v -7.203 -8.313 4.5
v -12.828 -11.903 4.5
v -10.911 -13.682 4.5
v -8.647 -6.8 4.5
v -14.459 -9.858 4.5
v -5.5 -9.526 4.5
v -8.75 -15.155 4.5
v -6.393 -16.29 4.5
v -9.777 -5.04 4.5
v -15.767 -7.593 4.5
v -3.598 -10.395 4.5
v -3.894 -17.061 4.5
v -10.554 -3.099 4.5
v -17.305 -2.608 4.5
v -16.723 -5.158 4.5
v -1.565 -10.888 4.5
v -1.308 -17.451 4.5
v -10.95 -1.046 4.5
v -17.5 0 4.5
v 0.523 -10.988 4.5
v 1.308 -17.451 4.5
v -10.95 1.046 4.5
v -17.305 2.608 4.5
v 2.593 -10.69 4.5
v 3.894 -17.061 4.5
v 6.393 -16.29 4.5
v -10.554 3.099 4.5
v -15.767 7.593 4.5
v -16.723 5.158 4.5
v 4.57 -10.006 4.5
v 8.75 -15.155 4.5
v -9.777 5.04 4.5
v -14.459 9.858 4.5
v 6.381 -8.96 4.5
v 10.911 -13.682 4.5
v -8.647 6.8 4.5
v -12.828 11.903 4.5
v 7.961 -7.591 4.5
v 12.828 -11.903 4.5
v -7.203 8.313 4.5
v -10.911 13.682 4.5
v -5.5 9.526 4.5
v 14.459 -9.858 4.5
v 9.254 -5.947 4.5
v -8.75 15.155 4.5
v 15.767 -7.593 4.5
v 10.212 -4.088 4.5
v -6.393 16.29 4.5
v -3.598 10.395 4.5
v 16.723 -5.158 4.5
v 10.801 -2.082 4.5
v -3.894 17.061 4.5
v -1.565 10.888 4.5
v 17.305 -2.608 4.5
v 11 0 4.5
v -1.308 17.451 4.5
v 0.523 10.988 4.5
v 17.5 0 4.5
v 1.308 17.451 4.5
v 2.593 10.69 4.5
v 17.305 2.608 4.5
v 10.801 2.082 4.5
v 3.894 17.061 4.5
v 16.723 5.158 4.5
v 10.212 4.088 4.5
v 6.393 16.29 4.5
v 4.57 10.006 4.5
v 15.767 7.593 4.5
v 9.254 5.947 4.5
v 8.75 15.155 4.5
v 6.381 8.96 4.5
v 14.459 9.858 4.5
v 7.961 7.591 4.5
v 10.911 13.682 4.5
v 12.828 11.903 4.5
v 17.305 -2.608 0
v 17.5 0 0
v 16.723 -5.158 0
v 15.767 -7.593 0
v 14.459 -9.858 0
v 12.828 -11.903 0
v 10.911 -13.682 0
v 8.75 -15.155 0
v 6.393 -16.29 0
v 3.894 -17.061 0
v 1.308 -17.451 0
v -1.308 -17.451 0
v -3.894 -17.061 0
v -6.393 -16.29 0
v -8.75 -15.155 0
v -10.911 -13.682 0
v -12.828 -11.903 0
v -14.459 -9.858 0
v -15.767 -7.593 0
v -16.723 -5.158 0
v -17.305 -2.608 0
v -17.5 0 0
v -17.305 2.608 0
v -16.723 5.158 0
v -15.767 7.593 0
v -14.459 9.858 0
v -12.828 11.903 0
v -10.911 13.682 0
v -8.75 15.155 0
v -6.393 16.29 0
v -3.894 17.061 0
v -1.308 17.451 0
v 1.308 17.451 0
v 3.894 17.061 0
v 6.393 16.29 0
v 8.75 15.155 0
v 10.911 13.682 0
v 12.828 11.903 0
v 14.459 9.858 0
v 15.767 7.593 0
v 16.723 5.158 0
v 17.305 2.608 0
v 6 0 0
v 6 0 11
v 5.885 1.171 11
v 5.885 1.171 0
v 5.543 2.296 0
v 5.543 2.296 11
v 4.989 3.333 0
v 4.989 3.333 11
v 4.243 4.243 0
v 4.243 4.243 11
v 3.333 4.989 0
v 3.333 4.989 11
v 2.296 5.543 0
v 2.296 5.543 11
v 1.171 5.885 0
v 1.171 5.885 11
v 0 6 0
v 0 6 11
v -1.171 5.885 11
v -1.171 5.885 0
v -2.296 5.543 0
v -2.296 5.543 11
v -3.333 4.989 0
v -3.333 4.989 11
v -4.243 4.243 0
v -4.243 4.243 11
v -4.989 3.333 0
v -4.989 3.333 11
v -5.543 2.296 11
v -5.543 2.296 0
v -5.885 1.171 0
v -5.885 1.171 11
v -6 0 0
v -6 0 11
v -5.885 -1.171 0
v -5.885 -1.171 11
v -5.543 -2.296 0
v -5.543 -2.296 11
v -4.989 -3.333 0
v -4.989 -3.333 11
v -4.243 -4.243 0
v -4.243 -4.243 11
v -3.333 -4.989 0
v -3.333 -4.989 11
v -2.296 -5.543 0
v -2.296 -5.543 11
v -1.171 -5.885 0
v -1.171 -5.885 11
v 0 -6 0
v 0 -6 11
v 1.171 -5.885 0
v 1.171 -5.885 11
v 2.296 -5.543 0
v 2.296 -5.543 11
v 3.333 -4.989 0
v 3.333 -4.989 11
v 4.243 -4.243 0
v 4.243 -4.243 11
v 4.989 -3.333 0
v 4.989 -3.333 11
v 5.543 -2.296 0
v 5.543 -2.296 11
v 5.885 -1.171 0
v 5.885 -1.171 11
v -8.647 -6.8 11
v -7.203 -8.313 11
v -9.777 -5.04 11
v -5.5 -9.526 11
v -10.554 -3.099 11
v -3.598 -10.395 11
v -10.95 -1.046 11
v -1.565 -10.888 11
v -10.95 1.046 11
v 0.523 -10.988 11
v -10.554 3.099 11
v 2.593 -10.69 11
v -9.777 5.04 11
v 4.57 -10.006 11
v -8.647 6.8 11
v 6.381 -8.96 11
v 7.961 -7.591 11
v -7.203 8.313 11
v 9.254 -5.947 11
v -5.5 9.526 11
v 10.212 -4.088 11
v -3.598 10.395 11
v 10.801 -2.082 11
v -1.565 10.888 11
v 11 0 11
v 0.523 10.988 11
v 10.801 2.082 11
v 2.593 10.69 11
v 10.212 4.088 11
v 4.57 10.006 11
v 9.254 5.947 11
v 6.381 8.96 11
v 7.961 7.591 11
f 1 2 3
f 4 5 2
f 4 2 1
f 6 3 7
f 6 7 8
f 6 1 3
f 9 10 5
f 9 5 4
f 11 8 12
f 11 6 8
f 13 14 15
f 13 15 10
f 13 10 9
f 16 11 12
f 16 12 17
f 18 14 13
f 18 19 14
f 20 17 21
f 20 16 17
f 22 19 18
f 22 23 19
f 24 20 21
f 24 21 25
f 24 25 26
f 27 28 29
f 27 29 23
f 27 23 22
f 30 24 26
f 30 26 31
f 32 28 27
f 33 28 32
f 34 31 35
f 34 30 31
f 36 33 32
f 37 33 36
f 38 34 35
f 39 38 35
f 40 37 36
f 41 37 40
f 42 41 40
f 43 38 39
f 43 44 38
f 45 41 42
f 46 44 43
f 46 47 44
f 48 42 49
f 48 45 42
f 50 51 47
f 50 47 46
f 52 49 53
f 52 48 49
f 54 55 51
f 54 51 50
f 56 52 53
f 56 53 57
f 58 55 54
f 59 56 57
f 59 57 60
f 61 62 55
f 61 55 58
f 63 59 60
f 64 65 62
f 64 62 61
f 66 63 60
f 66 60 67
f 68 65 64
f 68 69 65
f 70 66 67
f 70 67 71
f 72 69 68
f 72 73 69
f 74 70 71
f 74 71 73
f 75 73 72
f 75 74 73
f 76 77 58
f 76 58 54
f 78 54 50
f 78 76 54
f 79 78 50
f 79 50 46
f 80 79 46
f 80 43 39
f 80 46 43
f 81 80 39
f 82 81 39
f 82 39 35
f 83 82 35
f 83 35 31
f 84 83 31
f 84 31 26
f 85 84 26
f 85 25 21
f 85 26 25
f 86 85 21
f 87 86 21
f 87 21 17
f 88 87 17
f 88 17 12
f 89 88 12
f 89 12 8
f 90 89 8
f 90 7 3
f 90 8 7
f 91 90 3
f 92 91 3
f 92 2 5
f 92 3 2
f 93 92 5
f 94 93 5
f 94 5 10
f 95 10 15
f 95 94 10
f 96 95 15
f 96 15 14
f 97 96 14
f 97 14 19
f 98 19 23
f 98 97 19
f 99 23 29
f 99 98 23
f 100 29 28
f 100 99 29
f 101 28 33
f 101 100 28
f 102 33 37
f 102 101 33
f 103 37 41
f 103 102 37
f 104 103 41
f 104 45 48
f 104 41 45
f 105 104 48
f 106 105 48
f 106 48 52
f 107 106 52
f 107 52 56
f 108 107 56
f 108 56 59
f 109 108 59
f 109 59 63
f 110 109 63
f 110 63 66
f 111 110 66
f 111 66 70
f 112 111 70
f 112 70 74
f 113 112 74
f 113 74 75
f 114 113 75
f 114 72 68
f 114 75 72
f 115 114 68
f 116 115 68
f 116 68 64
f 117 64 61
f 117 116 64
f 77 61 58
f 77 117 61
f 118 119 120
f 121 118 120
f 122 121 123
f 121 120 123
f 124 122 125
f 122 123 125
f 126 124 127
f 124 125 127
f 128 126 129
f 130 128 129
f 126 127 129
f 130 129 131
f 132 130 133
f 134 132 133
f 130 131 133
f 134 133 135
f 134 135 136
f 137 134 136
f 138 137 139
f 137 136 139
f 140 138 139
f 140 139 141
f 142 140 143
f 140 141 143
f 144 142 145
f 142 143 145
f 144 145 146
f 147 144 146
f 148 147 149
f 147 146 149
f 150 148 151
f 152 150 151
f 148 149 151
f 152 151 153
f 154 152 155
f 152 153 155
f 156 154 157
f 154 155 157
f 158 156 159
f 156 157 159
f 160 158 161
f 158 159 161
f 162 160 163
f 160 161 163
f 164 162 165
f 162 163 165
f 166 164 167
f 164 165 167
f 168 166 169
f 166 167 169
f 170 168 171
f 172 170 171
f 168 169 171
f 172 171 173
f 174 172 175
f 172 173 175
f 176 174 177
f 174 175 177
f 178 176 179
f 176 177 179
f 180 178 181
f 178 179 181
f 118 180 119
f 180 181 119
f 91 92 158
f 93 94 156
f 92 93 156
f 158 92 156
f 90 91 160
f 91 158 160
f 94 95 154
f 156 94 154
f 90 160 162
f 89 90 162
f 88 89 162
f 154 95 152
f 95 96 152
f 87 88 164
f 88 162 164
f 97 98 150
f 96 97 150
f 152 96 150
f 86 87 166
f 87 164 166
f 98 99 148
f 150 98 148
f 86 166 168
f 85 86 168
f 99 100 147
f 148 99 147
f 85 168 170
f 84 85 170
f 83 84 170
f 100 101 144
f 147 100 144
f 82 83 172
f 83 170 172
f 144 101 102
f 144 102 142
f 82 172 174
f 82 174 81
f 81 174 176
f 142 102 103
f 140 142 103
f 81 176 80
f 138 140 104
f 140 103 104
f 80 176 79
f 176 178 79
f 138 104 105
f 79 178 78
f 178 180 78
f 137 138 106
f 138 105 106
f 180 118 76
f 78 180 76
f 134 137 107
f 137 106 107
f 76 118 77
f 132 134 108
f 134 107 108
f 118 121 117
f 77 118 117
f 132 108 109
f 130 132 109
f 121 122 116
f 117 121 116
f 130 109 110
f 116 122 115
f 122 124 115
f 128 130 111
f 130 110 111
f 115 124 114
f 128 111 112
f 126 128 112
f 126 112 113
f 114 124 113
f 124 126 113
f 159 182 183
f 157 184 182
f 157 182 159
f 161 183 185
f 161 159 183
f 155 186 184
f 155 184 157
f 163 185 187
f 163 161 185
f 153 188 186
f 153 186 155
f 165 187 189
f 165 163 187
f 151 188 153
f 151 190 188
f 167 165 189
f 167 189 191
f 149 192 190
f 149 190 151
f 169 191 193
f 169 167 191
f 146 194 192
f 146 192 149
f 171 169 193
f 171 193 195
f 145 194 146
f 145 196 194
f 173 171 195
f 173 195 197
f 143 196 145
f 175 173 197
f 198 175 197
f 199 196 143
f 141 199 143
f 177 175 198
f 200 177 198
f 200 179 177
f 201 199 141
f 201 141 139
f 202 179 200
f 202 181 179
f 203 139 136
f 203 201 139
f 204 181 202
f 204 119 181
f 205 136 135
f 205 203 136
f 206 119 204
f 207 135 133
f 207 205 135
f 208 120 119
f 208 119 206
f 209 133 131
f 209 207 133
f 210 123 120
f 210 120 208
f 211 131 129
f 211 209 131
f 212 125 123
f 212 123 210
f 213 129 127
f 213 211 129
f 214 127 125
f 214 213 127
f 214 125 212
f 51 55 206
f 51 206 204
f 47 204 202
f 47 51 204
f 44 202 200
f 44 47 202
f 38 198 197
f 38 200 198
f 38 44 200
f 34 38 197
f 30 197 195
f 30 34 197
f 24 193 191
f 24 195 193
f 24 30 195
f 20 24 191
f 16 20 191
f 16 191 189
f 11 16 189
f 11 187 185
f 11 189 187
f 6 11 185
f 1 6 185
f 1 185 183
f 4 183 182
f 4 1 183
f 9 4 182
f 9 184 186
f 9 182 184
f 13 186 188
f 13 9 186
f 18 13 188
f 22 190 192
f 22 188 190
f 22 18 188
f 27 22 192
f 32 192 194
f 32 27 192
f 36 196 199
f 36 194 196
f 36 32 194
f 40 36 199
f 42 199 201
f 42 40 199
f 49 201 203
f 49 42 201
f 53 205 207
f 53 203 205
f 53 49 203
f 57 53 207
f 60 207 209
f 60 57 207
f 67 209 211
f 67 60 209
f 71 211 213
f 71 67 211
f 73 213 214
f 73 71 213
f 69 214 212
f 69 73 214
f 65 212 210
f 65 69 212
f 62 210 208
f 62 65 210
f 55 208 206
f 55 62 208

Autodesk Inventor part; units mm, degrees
ref_plane "YZ Plane" through (0, 0, 0) normal (1, 0, 0) x (0, 1, 0)
ref_plane "XZ Plane" through (0, 0, 0) normal (0, 1, 0) x (-1, 0, 0)
ref_plane "XY Plane" through (0, 0, 0) normal (0, 0, 1) x (1, 0, 0)
sketch "Sketch1" plane through (0, 0, 0) normal (0, 0, 1) x (1, 0, 0)
  circle A0 centre (0, 0) radius 17.5
  dimension "d0" = 35
extrude "Extrusion1" add sketch "Sketch1" along normal blind 4.5
sketch "Sketch2" plane through (0, 0, 4.5) normal (0, 0, 1) x (1, 0, 0)
  circle A0 centre (0, 0) radius 17.5 projected
  circle A1 centre (0, 0) radius 11
  dimension "d3" = 22
extrude "Extrusion2" add sketch "Sketch2" along normal blind 6.5 contours A1
sketch "Sketch3" plane through (0, 0, 11) normal (0, 0, 1) x (1, 0, 0)
  circle A0 centre (0, 0) radius 11 projected
  circle A1 centre (0, 0) radius 6
  dimension "d6" = 12
extrude "Extrusion3" cut sketch "Sketch3" against normal through all contours A1
properties part number "culinder cap"
